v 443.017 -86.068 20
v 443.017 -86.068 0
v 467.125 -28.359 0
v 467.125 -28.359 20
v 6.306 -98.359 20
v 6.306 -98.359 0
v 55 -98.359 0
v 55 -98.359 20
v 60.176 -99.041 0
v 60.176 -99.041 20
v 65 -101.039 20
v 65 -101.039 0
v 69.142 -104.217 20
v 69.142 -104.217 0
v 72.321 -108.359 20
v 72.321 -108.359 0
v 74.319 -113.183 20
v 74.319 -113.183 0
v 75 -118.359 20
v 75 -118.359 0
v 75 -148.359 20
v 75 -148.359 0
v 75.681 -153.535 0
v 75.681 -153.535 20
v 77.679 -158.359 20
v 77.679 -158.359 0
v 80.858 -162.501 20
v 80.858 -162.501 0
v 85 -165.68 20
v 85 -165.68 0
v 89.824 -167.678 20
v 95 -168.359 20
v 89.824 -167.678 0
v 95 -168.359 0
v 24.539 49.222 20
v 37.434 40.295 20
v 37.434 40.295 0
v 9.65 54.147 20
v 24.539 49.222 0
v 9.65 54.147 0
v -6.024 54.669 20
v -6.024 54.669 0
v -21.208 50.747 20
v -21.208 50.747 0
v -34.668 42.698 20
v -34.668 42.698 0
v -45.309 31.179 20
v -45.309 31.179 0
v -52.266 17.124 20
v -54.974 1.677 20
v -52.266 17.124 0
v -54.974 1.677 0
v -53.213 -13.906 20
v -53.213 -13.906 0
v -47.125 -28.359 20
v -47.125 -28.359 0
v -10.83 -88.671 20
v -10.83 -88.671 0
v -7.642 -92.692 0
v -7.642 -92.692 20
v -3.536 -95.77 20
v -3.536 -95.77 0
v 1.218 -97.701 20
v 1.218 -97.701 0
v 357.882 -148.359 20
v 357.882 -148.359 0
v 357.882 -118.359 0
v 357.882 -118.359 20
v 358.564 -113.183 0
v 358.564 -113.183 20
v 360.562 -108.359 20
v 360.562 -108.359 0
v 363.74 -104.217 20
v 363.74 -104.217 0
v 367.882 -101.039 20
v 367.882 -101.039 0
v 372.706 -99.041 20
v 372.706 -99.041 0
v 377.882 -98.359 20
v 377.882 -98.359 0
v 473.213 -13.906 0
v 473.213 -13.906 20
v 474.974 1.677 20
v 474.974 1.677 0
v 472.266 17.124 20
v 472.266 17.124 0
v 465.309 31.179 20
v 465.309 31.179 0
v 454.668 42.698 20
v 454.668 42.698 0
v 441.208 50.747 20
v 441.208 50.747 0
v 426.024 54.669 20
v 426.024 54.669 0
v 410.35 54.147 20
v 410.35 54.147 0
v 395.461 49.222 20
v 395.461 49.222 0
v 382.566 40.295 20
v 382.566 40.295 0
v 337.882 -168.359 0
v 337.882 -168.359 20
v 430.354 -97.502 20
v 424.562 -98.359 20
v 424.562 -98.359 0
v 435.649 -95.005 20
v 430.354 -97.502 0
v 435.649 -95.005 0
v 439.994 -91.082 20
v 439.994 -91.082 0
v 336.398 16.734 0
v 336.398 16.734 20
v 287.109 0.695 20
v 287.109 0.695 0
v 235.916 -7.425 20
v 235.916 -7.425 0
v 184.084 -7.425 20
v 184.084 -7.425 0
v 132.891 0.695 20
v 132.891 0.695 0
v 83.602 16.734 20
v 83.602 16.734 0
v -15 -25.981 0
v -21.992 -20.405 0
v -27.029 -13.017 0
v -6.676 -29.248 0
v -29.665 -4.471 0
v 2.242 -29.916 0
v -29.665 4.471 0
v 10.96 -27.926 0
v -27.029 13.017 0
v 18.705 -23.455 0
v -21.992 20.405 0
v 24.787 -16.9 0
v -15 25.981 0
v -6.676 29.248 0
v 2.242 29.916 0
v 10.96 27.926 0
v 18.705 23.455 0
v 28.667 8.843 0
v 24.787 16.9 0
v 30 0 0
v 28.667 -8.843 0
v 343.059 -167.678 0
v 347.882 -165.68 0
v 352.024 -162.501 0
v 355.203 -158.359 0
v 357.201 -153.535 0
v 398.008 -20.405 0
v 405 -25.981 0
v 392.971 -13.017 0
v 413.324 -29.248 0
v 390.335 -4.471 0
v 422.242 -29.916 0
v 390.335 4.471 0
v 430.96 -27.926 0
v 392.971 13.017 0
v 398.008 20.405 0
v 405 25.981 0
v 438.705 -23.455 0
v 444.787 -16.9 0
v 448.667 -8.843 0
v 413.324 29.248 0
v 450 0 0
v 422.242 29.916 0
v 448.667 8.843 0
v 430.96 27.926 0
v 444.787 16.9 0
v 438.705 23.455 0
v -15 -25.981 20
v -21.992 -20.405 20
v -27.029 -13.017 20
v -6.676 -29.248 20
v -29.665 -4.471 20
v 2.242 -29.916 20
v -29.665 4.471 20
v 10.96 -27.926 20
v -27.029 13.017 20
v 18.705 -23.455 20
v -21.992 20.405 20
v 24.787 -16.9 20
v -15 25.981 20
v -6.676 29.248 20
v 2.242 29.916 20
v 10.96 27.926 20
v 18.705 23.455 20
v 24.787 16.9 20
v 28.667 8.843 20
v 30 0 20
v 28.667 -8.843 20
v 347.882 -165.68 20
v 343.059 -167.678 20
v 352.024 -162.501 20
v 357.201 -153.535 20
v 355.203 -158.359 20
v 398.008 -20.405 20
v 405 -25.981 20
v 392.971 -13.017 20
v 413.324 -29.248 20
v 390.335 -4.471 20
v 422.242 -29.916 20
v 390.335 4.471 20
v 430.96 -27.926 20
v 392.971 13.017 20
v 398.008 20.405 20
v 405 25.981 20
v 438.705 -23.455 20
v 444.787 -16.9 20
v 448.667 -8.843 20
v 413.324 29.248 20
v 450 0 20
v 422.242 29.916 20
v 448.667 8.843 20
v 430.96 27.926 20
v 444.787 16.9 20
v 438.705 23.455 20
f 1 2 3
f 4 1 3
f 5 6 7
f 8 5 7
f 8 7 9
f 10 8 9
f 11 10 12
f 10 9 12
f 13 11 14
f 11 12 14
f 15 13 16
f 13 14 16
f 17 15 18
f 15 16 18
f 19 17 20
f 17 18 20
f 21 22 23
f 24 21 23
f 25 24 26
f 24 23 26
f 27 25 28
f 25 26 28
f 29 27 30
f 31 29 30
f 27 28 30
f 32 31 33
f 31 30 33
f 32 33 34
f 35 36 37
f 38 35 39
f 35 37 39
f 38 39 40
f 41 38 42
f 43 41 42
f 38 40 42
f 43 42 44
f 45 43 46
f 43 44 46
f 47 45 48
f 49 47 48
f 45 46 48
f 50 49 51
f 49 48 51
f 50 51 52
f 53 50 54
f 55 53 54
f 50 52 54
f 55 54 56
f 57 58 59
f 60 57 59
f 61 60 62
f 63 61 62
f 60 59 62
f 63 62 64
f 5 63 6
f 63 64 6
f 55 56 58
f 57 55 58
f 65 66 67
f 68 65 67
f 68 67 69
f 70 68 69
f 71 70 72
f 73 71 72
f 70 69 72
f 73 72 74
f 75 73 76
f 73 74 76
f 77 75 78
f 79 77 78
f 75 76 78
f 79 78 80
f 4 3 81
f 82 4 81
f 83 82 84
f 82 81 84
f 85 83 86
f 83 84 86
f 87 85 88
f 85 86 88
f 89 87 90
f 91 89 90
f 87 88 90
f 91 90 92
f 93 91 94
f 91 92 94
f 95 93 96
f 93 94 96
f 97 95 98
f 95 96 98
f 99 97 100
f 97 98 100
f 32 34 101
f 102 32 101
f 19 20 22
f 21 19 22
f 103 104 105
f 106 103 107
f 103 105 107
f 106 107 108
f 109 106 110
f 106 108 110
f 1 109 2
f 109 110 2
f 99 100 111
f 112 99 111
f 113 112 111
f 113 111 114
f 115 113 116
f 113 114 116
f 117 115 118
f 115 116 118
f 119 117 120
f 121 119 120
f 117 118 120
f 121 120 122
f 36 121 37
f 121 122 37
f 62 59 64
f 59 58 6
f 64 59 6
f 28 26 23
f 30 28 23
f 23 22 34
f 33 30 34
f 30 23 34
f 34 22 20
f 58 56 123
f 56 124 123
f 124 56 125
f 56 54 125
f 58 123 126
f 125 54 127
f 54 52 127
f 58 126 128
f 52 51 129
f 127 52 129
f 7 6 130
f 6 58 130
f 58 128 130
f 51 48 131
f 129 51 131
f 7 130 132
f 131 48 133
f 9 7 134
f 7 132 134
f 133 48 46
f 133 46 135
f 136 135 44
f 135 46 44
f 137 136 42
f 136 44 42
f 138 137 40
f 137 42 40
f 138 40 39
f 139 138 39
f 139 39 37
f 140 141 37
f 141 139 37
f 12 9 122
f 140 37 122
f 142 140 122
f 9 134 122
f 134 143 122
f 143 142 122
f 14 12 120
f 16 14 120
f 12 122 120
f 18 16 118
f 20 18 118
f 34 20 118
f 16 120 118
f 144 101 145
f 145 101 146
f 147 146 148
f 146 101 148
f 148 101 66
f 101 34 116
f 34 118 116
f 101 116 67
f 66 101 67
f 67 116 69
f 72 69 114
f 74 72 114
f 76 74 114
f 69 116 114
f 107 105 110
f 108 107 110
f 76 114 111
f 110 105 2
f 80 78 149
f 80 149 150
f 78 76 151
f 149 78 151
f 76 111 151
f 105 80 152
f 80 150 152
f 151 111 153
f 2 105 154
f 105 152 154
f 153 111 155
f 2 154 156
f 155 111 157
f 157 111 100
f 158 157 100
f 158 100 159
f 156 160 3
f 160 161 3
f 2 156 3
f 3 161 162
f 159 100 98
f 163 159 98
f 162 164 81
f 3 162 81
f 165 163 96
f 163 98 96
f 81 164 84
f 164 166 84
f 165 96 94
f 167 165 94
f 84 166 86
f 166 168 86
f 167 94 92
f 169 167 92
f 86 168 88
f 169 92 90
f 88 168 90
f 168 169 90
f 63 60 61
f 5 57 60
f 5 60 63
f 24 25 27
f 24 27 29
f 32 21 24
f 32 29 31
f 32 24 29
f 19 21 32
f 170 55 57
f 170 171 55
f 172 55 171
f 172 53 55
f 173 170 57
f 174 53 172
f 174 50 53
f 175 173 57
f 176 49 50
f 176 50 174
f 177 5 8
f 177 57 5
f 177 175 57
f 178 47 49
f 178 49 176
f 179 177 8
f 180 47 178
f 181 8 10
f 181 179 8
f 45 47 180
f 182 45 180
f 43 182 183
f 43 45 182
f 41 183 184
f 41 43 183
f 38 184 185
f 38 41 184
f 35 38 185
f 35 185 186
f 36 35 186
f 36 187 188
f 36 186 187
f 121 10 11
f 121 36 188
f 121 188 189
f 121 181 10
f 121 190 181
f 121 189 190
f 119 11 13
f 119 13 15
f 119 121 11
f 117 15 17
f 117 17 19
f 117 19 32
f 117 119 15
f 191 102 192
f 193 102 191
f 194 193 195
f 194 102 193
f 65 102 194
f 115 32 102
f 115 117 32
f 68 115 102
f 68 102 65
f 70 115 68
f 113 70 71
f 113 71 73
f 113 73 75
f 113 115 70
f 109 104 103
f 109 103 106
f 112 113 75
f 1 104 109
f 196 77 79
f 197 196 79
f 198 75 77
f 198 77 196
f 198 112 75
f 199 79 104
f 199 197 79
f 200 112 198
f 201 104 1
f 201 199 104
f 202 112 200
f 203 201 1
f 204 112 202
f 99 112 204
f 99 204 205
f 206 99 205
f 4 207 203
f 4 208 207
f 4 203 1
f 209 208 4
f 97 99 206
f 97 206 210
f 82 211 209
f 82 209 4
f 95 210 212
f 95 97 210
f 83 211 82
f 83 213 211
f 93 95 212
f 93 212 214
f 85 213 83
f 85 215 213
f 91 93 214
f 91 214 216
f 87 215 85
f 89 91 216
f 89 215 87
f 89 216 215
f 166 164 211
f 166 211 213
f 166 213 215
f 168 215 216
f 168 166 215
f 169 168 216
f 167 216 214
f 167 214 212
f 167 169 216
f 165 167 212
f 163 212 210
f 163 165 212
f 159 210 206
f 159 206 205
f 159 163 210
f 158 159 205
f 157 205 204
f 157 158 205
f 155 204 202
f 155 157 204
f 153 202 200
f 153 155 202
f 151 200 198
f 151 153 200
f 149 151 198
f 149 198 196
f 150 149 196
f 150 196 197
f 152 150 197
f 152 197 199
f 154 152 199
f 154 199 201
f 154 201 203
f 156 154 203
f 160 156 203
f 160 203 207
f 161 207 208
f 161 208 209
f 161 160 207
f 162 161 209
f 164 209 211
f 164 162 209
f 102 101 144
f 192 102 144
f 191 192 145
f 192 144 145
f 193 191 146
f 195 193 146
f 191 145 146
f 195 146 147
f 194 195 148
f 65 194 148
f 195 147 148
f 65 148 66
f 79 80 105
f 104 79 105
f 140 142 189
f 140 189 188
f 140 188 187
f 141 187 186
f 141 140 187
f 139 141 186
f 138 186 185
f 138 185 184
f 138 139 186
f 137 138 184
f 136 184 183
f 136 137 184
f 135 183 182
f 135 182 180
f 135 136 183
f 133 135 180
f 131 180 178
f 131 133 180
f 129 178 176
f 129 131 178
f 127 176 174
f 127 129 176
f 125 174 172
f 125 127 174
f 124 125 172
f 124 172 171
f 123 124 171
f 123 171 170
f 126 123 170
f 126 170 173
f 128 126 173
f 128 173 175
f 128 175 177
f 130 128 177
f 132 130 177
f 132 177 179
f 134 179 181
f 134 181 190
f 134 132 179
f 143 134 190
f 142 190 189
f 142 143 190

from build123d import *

# Parameters (mm, degrees)
IZIM1_R                     = 30
Y_KSEKLIK_EKSTR_ZYON1_DEPTH = 20


with BuildPart() as part:
    # Çizim1 → Yükseklik-Ekstrüzyon1 (new body)
    with BuildSketch(Plane.XY):
        with BuildLine():
            Line((-47.124957284, -28.359097323), (-10.82985396, -88.671496349))
            ThreePointArc((-10.82985396, -88.671496349), (-3.536066994, -95.769553672), (6.306494143, -98.359097323))
            Line((6.306494143, -98.359097323), (55, -98.359097323))
            ThreePointArc((55, -98.359097323), (69.142135624, -104.216961699), (75, -118.359097323))
            Line((75, -118.359097323), (75, -148.359097323))
            ThreePointArc((75, -148.359097323), (80.857864376, -162.501232947), (95, -168.359097323))
            Line((95, -168.359097323), (337.882293863, -168.359097323))
            ThreePointArc((337.882293863, -168.359097323), (352.024429487, -162.501232947), (357.882293863, -148.359097323))
            Line((357.882293863, -148.359097323), (357.882293863, -118.359097323))
            ThreePointArc((357.882293863, -118.359097323), (363.740158239, -104.216961699), (377.882293863, -98.359097323))
            Line((377.882293863, -98.359097323), (424.56231333, -98.359097323))
            ThreePointArc((424.56231333, -98.359097323), (435.648622021, -95.005230796), (443.016730749, -86.068473283))
            Line((443.016730749, -86.068473283), (467.124957284, -28.359097323))
            ThreePointArc((467.124957284, -28.359097323), (454.66761994, 42.69843238), (382.566415624, 40.295493058))
            ThreePointArc((382.566415624, 40.295493058), (210, -8.444596477), (37.433584376, 40.295493058))
            ThreePointArc((37.433584376, 40.295493058), (-34.66761994, 42.69843238), (-47.124957284, -28.359097323))
        make_face()
        Circle(IZIM1_R, mode=Mode.SUBTRACT)
        with Locations((420, 0)):
            Circle(IZIM1_R, mode=Mode.SUBTRACT)
    extrude(amount=Y_KSEKLIK_EKSTR_ZYON1_DEPTH)


solid = part.part
